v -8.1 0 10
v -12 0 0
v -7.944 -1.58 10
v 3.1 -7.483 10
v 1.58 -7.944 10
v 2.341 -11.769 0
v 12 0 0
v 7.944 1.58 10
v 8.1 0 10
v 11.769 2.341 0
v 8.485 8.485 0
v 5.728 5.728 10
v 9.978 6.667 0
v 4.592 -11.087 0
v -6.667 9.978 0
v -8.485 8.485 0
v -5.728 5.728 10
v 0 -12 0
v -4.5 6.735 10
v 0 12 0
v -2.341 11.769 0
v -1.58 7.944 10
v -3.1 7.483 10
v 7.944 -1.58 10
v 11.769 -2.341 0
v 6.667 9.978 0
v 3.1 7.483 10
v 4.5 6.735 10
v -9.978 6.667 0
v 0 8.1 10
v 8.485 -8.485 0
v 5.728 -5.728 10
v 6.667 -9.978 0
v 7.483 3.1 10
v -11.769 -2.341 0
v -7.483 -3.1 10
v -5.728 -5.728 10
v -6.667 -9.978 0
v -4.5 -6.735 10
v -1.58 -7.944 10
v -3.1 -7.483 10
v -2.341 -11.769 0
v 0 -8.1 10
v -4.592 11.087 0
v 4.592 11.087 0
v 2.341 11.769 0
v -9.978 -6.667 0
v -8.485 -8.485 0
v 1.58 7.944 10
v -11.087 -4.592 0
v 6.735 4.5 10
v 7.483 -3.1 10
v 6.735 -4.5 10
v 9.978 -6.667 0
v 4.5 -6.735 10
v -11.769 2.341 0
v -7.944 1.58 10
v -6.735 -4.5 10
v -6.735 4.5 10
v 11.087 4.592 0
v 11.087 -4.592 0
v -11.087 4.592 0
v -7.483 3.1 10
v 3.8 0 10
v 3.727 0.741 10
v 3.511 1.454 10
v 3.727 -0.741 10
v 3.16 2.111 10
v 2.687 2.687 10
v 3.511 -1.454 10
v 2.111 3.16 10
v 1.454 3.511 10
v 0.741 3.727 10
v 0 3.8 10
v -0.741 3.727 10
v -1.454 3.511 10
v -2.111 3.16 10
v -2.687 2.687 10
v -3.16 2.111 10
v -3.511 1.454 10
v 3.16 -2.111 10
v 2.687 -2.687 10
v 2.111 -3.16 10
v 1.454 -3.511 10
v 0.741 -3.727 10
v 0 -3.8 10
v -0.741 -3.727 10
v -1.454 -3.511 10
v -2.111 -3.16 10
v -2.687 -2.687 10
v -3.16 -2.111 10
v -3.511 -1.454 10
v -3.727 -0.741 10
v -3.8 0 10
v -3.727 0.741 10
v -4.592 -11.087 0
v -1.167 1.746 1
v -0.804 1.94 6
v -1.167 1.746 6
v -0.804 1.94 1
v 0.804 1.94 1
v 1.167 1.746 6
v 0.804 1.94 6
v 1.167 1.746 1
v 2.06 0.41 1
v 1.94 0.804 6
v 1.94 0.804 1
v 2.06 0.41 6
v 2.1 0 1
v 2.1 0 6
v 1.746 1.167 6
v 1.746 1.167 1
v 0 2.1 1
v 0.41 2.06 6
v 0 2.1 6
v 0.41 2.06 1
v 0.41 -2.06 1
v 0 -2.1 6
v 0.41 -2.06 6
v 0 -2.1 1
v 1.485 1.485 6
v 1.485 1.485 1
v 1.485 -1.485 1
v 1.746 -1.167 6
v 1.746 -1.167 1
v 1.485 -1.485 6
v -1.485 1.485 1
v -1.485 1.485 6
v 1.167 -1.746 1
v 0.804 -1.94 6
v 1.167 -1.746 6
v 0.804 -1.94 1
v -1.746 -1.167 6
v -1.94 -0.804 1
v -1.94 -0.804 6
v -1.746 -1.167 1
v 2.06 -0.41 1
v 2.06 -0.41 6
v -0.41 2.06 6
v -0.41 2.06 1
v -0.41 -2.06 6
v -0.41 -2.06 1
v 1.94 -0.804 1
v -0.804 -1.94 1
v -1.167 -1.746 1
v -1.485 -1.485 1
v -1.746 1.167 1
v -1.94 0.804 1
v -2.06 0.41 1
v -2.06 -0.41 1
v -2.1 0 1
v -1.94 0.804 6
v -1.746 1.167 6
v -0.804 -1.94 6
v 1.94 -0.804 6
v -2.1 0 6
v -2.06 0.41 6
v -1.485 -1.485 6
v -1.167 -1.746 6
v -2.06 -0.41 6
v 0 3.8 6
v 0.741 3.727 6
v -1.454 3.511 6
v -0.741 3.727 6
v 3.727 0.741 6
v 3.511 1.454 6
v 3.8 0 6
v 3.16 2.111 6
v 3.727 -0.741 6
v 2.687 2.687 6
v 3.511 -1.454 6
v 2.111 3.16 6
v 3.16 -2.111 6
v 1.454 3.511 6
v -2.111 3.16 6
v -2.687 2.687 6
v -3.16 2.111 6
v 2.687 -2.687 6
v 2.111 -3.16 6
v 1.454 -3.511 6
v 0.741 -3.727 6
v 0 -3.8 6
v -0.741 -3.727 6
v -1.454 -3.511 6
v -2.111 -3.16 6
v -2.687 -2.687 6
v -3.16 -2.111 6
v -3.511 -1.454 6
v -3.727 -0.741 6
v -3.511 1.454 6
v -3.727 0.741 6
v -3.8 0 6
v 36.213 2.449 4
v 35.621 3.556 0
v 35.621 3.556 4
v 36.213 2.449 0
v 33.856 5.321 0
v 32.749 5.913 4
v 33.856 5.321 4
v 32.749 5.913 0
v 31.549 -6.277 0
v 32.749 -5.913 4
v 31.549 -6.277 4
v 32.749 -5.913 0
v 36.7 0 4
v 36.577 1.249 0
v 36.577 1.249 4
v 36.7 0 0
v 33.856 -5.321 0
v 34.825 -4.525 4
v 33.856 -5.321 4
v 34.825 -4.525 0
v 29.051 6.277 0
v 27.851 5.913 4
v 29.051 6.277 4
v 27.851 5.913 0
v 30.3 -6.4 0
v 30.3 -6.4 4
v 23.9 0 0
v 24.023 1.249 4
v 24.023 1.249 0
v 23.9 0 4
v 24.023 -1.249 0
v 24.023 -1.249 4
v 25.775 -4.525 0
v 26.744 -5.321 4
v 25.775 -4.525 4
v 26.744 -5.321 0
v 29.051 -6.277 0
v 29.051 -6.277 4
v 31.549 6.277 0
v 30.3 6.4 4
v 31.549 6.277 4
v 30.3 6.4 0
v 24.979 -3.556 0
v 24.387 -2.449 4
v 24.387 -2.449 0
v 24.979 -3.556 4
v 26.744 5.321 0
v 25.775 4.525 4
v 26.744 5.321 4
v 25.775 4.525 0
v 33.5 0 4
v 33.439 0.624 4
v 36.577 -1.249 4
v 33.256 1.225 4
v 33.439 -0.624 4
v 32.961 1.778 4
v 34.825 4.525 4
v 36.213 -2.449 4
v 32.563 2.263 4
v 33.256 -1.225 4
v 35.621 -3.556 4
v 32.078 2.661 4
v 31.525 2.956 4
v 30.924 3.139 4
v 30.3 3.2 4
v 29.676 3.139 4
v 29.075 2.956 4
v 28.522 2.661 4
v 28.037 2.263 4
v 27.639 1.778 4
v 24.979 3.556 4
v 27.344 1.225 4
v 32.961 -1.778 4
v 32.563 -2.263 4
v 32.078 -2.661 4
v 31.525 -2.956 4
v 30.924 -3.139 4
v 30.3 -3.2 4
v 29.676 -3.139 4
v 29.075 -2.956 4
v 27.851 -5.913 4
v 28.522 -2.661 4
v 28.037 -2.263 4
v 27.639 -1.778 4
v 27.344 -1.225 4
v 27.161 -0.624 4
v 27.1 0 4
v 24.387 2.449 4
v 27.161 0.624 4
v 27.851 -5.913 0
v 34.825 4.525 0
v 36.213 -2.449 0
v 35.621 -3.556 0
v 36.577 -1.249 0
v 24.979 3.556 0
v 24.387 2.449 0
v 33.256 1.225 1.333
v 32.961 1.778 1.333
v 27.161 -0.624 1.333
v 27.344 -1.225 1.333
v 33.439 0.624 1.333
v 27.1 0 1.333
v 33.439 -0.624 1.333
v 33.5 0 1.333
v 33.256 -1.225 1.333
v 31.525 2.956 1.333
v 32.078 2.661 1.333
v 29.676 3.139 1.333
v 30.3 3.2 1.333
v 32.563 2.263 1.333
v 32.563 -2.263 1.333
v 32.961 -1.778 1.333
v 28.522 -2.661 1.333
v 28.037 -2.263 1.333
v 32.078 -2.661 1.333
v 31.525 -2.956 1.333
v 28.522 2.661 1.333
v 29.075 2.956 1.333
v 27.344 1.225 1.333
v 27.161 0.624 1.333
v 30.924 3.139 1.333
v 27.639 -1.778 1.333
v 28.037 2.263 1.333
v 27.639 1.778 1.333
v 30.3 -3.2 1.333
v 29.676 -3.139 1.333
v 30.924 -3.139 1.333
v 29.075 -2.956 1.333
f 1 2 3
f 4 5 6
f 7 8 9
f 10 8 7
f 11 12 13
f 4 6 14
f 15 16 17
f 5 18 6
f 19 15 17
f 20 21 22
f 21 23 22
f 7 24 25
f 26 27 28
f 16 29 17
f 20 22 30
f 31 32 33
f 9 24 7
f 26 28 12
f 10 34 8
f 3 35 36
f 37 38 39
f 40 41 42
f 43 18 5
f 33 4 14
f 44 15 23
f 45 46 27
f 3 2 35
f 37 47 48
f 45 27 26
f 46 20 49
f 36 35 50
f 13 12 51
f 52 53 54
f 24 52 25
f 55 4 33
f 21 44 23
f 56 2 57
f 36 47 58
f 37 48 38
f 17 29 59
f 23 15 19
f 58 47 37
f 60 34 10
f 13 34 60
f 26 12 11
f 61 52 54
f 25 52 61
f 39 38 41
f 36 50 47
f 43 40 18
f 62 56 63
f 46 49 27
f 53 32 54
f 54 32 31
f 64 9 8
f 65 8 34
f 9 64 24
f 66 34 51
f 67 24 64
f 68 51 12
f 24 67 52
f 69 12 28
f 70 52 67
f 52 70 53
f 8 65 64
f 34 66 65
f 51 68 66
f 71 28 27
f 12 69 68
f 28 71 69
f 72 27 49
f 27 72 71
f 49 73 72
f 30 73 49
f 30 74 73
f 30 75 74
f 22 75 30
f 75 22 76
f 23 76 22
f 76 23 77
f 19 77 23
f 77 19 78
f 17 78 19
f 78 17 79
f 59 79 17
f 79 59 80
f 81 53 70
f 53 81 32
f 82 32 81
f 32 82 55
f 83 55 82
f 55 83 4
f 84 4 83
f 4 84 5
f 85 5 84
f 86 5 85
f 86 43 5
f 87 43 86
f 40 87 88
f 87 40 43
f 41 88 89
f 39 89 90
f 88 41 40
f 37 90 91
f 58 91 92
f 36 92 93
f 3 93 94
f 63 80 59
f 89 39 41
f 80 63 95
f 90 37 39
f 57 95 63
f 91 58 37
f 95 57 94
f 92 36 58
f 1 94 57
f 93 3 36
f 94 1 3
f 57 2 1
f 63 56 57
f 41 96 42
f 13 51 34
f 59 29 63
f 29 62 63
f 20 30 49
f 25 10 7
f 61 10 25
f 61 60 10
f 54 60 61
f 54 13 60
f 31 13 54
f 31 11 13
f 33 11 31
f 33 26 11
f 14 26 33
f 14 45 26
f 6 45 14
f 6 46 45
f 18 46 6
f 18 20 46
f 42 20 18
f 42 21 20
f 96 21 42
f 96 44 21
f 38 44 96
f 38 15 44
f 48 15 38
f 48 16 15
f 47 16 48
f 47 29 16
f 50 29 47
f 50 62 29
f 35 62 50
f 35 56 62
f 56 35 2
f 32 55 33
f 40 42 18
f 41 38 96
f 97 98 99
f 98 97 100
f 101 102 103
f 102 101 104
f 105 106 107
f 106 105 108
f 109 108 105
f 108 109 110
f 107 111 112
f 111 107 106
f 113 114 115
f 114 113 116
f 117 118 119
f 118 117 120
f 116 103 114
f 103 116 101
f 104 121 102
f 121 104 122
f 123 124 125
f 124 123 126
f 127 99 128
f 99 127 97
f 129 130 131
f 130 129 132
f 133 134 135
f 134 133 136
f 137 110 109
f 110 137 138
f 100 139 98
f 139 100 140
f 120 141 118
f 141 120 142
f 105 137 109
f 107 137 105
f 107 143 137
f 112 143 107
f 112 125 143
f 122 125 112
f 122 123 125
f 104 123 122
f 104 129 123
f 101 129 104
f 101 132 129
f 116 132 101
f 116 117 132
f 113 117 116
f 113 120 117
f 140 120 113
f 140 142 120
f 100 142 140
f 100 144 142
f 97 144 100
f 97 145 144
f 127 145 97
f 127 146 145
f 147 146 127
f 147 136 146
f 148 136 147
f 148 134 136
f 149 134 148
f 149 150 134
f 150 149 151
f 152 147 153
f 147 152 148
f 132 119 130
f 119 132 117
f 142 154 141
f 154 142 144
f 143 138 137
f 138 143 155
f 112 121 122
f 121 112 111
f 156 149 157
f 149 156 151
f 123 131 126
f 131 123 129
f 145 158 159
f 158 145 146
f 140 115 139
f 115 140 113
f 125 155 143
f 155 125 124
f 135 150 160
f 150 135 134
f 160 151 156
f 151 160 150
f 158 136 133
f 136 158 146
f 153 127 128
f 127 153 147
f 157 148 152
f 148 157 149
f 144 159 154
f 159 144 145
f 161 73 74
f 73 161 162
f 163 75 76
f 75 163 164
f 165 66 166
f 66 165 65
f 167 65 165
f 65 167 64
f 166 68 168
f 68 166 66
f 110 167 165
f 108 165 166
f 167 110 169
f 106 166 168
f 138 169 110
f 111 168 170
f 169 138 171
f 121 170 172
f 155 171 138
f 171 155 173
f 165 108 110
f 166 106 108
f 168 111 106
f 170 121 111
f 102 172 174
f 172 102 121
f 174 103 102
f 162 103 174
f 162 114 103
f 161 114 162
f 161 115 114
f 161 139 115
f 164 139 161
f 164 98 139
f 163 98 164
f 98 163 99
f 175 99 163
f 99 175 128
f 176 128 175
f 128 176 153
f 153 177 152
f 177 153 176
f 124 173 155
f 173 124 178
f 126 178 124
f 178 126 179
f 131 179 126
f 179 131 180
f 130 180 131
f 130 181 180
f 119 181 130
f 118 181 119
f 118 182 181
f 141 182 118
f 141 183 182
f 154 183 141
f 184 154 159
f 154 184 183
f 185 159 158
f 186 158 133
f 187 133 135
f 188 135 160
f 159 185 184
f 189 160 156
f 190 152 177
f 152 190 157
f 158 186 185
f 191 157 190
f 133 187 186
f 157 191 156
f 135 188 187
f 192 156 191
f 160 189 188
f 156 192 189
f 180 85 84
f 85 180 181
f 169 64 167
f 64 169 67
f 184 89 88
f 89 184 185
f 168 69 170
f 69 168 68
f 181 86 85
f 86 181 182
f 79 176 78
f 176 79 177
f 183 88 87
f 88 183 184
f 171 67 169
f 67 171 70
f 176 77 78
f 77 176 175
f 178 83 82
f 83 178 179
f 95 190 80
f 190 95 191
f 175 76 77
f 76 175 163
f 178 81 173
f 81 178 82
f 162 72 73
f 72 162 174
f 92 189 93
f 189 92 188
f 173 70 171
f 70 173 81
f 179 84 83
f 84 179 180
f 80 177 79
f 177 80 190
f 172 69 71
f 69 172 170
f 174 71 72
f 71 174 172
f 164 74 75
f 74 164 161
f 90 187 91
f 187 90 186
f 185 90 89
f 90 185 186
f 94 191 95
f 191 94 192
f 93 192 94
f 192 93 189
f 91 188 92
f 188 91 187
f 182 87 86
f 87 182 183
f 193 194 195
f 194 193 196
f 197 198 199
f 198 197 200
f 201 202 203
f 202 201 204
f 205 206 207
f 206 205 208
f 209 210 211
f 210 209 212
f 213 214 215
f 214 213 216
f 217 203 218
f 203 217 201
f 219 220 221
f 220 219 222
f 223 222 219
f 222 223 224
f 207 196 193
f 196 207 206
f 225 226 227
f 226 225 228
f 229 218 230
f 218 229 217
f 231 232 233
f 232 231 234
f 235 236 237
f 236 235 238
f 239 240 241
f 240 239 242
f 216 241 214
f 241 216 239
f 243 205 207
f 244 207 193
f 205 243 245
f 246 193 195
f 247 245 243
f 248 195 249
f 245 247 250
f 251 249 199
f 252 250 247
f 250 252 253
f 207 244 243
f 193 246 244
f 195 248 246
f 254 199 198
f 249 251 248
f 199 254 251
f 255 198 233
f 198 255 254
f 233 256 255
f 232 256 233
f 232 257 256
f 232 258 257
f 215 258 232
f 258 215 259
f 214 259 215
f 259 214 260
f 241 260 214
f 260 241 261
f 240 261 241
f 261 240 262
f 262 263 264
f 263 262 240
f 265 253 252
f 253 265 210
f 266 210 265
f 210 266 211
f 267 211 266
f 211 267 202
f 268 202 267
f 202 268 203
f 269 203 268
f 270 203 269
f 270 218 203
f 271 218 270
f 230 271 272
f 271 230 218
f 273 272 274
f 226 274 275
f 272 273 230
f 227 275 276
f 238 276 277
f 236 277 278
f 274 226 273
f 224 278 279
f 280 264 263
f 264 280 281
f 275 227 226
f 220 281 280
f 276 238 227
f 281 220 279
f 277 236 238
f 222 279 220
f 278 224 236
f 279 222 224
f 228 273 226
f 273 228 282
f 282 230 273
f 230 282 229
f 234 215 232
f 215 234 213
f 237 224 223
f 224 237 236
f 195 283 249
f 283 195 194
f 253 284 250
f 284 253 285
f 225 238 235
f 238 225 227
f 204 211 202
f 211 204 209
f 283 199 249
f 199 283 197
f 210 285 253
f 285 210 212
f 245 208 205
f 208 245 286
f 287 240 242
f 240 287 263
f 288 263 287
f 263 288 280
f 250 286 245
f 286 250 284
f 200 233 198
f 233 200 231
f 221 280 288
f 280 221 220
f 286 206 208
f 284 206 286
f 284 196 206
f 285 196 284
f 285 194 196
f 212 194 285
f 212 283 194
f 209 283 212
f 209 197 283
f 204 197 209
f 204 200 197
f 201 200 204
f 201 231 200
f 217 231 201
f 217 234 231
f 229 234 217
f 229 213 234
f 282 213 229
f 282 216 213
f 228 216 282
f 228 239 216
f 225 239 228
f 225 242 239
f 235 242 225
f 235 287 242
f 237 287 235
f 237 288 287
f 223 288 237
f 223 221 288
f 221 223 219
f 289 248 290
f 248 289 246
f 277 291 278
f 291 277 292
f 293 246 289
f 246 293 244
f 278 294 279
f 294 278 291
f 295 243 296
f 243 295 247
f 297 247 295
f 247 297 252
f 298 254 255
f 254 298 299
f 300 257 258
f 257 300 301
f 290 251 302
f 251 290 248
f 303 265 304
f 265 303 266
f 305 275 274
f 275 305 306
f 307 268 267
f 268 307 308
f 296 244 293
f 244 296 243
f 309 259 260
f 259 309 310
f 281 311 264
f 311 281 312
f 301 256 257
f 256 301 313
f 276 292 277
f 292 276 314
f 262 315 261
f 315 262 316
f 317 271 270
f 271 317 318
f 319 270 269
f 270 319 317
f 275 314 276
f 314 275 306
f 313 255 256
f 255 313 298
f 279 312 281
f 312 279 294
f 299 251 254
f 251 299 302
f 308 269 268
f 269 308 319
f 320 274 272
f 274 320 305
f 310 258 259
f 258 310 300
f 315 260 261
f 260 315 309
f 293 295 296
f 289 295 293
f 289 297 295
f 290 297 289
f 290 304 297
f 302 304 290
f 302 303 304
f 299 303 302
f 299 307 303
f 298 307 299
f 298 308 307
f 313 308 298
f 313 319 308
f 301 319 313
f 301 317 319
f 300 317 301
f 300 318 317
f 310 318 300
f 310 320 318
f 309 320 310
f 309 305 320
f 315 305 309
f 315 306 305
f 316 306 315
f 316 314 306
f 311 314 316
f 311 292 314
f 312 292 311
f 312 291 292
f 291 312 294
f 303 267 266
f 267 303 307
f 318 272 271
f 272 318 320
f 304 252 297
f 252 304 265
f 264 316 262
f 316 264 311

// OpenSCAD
module base(height, radius){

  difference(){
    cylinder(h=height*2, r1=12,r2=radius+6, $fn=32);
	translate([0,0,1]) cylinder(h=(height*2)+1, r=radius, $fn=32);
    translate([0,0,height*2-4]) cylinder(r=3.8, h=5, $fn=32);

    }//diff
}//module
module cap(height, radius){
  difference(){
    cylinder(h=height, r=radius*2, $fn=32);
	translate([0,0,height/3]) cylinder(h=height, r=radius, $fn=32);
    }//diff
}//module


base(5,2.1);
translate([30.30,0])cap(4,3.2);
